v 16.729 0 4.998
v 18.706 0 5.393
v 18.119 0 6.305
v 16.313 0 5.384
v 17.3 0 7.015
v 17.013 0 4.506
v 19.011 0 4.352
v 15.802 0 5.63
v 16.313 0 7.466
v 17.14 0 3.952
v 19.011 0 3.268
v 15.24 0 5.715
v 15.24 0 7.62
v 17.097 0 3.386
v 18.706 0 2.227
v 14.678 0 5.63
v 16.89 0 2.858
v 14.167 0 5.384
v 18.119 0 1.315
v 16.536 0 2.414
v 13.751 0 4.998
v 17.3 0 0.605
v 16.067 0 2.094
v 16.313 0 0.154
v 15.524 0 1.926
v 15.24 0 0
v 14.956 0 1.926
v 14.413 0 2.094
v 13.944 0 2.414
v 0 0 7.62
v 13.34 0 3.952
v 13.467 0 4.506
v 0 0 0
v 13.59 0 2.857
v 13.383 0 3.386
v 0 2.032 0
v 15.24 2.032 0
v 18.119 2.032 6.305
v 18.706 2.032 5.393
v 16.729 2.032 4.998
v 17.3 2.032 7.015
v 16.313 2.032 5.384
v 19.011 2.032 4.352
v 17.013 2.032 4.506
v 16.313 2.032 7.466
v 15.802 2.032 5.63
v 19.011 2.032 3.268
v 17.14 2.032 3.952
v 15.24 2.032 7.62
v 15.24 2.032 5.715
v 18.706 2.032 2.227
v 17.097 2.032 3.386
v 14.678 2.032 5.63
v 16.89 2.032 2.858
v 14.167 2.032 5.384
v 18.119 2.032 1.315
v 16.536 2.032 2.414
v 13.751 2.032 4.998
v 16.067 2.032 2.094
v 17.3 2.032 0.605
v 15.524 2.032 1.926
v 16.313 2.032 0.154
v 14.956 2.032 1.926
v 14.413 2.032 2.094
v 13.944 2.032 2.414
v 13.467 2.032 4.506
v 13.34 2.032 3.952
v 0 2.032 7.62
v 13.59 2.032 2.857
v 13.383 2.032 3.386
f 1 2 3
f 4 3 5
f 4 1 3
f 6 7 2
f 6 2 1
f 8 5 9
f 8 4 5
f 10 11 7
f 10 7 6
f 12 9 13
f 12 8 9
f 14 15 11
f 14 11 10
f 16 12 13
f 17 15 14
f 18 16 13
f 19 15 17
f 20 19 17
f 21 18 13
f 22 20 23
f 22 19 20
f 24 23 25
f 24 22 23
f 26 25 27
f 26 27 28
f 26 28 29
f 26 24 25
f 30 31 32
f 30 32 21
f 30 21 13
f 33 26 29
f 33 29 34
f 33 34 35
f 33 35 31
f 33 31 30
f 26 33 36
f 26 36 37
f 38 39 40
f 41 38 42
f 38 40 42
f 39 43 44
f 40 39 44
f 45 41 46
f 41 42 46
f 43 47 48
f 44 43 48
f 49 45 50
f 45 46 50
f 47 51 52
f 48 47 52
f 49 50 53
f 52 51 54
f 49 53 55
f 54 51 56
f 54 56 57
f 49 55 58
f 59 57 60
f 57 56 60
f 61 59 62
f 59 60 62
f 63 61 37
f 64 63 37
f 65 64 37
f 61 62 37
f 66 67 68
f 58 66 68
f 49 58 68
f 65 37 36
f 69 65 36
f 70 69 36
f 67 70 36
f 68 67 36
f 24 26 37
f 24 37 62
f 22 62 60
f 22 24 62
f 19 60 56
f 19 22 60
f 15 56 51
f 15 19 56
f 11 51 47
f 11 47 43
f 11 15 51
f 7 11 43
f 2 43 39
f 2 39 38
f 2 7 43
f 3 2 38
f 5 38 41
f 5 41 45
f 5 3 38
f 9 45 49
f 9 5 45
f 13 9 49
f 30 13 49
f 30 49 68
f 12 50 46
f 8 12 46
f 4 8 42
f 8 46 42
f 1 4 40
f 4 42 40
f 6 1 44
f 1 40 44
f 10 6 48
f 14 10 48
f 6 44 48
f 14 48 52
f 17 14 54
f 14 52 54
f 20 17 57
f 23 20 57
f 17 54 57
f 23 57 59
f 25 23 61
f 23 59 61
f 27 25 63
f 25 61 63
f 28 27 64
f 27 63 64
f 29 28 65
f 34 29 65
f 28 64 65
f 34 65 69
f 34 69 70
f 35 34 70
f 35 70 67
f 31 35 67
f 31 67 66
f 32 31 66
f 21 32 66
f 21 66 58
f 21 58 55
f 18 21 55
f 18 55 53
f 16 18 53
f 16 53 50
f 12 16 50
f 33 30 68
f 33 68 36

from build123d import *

# Parameters (mm, degrees)
BOSS_EXTRUDE1_DEPTH = 2.032
SKETCH2_R           = 1.905
CUT_EXTRUDE1_DEPTH  = 21.617854496


with BuildPart() as part:
    # Sketch1 → Boss-Extrude1 (new body)
    with BuildSketch(Plane(origin=(0, 0, 0), x_dir=(1, 0, 0), z_dir=(0, 1, 0))):
        with BuildLine():
            Line((0, 0), (15.24, 0))
            ThreePointArc((15.24, 0), (19.05, -3.81), (15.24, -7.62))
            Line((15.24, -7.62), (0, -7.62))
            Line((0, -7.62), (0, 0))
        make_face()
    extrude(amount=BOSS_EXTRUDE1_DEPTH)

    # Sketch2 → Cut-Extrude1 (cut, through all)
    with BuildSketch(Plane(origin=(0, 2.032, 0), x_dir=(1, 0, 0), z_dir=(0, 1, 0))):
        with Locations(Location((15.24, -3.81, 0), (0, 0, 270))):
            Circle(SKETCH2_R)
    extrude(amount=-CUT_EXTRUDE1_DEPTH, mode=Mode.SUBTRACT)


solid = part.part
